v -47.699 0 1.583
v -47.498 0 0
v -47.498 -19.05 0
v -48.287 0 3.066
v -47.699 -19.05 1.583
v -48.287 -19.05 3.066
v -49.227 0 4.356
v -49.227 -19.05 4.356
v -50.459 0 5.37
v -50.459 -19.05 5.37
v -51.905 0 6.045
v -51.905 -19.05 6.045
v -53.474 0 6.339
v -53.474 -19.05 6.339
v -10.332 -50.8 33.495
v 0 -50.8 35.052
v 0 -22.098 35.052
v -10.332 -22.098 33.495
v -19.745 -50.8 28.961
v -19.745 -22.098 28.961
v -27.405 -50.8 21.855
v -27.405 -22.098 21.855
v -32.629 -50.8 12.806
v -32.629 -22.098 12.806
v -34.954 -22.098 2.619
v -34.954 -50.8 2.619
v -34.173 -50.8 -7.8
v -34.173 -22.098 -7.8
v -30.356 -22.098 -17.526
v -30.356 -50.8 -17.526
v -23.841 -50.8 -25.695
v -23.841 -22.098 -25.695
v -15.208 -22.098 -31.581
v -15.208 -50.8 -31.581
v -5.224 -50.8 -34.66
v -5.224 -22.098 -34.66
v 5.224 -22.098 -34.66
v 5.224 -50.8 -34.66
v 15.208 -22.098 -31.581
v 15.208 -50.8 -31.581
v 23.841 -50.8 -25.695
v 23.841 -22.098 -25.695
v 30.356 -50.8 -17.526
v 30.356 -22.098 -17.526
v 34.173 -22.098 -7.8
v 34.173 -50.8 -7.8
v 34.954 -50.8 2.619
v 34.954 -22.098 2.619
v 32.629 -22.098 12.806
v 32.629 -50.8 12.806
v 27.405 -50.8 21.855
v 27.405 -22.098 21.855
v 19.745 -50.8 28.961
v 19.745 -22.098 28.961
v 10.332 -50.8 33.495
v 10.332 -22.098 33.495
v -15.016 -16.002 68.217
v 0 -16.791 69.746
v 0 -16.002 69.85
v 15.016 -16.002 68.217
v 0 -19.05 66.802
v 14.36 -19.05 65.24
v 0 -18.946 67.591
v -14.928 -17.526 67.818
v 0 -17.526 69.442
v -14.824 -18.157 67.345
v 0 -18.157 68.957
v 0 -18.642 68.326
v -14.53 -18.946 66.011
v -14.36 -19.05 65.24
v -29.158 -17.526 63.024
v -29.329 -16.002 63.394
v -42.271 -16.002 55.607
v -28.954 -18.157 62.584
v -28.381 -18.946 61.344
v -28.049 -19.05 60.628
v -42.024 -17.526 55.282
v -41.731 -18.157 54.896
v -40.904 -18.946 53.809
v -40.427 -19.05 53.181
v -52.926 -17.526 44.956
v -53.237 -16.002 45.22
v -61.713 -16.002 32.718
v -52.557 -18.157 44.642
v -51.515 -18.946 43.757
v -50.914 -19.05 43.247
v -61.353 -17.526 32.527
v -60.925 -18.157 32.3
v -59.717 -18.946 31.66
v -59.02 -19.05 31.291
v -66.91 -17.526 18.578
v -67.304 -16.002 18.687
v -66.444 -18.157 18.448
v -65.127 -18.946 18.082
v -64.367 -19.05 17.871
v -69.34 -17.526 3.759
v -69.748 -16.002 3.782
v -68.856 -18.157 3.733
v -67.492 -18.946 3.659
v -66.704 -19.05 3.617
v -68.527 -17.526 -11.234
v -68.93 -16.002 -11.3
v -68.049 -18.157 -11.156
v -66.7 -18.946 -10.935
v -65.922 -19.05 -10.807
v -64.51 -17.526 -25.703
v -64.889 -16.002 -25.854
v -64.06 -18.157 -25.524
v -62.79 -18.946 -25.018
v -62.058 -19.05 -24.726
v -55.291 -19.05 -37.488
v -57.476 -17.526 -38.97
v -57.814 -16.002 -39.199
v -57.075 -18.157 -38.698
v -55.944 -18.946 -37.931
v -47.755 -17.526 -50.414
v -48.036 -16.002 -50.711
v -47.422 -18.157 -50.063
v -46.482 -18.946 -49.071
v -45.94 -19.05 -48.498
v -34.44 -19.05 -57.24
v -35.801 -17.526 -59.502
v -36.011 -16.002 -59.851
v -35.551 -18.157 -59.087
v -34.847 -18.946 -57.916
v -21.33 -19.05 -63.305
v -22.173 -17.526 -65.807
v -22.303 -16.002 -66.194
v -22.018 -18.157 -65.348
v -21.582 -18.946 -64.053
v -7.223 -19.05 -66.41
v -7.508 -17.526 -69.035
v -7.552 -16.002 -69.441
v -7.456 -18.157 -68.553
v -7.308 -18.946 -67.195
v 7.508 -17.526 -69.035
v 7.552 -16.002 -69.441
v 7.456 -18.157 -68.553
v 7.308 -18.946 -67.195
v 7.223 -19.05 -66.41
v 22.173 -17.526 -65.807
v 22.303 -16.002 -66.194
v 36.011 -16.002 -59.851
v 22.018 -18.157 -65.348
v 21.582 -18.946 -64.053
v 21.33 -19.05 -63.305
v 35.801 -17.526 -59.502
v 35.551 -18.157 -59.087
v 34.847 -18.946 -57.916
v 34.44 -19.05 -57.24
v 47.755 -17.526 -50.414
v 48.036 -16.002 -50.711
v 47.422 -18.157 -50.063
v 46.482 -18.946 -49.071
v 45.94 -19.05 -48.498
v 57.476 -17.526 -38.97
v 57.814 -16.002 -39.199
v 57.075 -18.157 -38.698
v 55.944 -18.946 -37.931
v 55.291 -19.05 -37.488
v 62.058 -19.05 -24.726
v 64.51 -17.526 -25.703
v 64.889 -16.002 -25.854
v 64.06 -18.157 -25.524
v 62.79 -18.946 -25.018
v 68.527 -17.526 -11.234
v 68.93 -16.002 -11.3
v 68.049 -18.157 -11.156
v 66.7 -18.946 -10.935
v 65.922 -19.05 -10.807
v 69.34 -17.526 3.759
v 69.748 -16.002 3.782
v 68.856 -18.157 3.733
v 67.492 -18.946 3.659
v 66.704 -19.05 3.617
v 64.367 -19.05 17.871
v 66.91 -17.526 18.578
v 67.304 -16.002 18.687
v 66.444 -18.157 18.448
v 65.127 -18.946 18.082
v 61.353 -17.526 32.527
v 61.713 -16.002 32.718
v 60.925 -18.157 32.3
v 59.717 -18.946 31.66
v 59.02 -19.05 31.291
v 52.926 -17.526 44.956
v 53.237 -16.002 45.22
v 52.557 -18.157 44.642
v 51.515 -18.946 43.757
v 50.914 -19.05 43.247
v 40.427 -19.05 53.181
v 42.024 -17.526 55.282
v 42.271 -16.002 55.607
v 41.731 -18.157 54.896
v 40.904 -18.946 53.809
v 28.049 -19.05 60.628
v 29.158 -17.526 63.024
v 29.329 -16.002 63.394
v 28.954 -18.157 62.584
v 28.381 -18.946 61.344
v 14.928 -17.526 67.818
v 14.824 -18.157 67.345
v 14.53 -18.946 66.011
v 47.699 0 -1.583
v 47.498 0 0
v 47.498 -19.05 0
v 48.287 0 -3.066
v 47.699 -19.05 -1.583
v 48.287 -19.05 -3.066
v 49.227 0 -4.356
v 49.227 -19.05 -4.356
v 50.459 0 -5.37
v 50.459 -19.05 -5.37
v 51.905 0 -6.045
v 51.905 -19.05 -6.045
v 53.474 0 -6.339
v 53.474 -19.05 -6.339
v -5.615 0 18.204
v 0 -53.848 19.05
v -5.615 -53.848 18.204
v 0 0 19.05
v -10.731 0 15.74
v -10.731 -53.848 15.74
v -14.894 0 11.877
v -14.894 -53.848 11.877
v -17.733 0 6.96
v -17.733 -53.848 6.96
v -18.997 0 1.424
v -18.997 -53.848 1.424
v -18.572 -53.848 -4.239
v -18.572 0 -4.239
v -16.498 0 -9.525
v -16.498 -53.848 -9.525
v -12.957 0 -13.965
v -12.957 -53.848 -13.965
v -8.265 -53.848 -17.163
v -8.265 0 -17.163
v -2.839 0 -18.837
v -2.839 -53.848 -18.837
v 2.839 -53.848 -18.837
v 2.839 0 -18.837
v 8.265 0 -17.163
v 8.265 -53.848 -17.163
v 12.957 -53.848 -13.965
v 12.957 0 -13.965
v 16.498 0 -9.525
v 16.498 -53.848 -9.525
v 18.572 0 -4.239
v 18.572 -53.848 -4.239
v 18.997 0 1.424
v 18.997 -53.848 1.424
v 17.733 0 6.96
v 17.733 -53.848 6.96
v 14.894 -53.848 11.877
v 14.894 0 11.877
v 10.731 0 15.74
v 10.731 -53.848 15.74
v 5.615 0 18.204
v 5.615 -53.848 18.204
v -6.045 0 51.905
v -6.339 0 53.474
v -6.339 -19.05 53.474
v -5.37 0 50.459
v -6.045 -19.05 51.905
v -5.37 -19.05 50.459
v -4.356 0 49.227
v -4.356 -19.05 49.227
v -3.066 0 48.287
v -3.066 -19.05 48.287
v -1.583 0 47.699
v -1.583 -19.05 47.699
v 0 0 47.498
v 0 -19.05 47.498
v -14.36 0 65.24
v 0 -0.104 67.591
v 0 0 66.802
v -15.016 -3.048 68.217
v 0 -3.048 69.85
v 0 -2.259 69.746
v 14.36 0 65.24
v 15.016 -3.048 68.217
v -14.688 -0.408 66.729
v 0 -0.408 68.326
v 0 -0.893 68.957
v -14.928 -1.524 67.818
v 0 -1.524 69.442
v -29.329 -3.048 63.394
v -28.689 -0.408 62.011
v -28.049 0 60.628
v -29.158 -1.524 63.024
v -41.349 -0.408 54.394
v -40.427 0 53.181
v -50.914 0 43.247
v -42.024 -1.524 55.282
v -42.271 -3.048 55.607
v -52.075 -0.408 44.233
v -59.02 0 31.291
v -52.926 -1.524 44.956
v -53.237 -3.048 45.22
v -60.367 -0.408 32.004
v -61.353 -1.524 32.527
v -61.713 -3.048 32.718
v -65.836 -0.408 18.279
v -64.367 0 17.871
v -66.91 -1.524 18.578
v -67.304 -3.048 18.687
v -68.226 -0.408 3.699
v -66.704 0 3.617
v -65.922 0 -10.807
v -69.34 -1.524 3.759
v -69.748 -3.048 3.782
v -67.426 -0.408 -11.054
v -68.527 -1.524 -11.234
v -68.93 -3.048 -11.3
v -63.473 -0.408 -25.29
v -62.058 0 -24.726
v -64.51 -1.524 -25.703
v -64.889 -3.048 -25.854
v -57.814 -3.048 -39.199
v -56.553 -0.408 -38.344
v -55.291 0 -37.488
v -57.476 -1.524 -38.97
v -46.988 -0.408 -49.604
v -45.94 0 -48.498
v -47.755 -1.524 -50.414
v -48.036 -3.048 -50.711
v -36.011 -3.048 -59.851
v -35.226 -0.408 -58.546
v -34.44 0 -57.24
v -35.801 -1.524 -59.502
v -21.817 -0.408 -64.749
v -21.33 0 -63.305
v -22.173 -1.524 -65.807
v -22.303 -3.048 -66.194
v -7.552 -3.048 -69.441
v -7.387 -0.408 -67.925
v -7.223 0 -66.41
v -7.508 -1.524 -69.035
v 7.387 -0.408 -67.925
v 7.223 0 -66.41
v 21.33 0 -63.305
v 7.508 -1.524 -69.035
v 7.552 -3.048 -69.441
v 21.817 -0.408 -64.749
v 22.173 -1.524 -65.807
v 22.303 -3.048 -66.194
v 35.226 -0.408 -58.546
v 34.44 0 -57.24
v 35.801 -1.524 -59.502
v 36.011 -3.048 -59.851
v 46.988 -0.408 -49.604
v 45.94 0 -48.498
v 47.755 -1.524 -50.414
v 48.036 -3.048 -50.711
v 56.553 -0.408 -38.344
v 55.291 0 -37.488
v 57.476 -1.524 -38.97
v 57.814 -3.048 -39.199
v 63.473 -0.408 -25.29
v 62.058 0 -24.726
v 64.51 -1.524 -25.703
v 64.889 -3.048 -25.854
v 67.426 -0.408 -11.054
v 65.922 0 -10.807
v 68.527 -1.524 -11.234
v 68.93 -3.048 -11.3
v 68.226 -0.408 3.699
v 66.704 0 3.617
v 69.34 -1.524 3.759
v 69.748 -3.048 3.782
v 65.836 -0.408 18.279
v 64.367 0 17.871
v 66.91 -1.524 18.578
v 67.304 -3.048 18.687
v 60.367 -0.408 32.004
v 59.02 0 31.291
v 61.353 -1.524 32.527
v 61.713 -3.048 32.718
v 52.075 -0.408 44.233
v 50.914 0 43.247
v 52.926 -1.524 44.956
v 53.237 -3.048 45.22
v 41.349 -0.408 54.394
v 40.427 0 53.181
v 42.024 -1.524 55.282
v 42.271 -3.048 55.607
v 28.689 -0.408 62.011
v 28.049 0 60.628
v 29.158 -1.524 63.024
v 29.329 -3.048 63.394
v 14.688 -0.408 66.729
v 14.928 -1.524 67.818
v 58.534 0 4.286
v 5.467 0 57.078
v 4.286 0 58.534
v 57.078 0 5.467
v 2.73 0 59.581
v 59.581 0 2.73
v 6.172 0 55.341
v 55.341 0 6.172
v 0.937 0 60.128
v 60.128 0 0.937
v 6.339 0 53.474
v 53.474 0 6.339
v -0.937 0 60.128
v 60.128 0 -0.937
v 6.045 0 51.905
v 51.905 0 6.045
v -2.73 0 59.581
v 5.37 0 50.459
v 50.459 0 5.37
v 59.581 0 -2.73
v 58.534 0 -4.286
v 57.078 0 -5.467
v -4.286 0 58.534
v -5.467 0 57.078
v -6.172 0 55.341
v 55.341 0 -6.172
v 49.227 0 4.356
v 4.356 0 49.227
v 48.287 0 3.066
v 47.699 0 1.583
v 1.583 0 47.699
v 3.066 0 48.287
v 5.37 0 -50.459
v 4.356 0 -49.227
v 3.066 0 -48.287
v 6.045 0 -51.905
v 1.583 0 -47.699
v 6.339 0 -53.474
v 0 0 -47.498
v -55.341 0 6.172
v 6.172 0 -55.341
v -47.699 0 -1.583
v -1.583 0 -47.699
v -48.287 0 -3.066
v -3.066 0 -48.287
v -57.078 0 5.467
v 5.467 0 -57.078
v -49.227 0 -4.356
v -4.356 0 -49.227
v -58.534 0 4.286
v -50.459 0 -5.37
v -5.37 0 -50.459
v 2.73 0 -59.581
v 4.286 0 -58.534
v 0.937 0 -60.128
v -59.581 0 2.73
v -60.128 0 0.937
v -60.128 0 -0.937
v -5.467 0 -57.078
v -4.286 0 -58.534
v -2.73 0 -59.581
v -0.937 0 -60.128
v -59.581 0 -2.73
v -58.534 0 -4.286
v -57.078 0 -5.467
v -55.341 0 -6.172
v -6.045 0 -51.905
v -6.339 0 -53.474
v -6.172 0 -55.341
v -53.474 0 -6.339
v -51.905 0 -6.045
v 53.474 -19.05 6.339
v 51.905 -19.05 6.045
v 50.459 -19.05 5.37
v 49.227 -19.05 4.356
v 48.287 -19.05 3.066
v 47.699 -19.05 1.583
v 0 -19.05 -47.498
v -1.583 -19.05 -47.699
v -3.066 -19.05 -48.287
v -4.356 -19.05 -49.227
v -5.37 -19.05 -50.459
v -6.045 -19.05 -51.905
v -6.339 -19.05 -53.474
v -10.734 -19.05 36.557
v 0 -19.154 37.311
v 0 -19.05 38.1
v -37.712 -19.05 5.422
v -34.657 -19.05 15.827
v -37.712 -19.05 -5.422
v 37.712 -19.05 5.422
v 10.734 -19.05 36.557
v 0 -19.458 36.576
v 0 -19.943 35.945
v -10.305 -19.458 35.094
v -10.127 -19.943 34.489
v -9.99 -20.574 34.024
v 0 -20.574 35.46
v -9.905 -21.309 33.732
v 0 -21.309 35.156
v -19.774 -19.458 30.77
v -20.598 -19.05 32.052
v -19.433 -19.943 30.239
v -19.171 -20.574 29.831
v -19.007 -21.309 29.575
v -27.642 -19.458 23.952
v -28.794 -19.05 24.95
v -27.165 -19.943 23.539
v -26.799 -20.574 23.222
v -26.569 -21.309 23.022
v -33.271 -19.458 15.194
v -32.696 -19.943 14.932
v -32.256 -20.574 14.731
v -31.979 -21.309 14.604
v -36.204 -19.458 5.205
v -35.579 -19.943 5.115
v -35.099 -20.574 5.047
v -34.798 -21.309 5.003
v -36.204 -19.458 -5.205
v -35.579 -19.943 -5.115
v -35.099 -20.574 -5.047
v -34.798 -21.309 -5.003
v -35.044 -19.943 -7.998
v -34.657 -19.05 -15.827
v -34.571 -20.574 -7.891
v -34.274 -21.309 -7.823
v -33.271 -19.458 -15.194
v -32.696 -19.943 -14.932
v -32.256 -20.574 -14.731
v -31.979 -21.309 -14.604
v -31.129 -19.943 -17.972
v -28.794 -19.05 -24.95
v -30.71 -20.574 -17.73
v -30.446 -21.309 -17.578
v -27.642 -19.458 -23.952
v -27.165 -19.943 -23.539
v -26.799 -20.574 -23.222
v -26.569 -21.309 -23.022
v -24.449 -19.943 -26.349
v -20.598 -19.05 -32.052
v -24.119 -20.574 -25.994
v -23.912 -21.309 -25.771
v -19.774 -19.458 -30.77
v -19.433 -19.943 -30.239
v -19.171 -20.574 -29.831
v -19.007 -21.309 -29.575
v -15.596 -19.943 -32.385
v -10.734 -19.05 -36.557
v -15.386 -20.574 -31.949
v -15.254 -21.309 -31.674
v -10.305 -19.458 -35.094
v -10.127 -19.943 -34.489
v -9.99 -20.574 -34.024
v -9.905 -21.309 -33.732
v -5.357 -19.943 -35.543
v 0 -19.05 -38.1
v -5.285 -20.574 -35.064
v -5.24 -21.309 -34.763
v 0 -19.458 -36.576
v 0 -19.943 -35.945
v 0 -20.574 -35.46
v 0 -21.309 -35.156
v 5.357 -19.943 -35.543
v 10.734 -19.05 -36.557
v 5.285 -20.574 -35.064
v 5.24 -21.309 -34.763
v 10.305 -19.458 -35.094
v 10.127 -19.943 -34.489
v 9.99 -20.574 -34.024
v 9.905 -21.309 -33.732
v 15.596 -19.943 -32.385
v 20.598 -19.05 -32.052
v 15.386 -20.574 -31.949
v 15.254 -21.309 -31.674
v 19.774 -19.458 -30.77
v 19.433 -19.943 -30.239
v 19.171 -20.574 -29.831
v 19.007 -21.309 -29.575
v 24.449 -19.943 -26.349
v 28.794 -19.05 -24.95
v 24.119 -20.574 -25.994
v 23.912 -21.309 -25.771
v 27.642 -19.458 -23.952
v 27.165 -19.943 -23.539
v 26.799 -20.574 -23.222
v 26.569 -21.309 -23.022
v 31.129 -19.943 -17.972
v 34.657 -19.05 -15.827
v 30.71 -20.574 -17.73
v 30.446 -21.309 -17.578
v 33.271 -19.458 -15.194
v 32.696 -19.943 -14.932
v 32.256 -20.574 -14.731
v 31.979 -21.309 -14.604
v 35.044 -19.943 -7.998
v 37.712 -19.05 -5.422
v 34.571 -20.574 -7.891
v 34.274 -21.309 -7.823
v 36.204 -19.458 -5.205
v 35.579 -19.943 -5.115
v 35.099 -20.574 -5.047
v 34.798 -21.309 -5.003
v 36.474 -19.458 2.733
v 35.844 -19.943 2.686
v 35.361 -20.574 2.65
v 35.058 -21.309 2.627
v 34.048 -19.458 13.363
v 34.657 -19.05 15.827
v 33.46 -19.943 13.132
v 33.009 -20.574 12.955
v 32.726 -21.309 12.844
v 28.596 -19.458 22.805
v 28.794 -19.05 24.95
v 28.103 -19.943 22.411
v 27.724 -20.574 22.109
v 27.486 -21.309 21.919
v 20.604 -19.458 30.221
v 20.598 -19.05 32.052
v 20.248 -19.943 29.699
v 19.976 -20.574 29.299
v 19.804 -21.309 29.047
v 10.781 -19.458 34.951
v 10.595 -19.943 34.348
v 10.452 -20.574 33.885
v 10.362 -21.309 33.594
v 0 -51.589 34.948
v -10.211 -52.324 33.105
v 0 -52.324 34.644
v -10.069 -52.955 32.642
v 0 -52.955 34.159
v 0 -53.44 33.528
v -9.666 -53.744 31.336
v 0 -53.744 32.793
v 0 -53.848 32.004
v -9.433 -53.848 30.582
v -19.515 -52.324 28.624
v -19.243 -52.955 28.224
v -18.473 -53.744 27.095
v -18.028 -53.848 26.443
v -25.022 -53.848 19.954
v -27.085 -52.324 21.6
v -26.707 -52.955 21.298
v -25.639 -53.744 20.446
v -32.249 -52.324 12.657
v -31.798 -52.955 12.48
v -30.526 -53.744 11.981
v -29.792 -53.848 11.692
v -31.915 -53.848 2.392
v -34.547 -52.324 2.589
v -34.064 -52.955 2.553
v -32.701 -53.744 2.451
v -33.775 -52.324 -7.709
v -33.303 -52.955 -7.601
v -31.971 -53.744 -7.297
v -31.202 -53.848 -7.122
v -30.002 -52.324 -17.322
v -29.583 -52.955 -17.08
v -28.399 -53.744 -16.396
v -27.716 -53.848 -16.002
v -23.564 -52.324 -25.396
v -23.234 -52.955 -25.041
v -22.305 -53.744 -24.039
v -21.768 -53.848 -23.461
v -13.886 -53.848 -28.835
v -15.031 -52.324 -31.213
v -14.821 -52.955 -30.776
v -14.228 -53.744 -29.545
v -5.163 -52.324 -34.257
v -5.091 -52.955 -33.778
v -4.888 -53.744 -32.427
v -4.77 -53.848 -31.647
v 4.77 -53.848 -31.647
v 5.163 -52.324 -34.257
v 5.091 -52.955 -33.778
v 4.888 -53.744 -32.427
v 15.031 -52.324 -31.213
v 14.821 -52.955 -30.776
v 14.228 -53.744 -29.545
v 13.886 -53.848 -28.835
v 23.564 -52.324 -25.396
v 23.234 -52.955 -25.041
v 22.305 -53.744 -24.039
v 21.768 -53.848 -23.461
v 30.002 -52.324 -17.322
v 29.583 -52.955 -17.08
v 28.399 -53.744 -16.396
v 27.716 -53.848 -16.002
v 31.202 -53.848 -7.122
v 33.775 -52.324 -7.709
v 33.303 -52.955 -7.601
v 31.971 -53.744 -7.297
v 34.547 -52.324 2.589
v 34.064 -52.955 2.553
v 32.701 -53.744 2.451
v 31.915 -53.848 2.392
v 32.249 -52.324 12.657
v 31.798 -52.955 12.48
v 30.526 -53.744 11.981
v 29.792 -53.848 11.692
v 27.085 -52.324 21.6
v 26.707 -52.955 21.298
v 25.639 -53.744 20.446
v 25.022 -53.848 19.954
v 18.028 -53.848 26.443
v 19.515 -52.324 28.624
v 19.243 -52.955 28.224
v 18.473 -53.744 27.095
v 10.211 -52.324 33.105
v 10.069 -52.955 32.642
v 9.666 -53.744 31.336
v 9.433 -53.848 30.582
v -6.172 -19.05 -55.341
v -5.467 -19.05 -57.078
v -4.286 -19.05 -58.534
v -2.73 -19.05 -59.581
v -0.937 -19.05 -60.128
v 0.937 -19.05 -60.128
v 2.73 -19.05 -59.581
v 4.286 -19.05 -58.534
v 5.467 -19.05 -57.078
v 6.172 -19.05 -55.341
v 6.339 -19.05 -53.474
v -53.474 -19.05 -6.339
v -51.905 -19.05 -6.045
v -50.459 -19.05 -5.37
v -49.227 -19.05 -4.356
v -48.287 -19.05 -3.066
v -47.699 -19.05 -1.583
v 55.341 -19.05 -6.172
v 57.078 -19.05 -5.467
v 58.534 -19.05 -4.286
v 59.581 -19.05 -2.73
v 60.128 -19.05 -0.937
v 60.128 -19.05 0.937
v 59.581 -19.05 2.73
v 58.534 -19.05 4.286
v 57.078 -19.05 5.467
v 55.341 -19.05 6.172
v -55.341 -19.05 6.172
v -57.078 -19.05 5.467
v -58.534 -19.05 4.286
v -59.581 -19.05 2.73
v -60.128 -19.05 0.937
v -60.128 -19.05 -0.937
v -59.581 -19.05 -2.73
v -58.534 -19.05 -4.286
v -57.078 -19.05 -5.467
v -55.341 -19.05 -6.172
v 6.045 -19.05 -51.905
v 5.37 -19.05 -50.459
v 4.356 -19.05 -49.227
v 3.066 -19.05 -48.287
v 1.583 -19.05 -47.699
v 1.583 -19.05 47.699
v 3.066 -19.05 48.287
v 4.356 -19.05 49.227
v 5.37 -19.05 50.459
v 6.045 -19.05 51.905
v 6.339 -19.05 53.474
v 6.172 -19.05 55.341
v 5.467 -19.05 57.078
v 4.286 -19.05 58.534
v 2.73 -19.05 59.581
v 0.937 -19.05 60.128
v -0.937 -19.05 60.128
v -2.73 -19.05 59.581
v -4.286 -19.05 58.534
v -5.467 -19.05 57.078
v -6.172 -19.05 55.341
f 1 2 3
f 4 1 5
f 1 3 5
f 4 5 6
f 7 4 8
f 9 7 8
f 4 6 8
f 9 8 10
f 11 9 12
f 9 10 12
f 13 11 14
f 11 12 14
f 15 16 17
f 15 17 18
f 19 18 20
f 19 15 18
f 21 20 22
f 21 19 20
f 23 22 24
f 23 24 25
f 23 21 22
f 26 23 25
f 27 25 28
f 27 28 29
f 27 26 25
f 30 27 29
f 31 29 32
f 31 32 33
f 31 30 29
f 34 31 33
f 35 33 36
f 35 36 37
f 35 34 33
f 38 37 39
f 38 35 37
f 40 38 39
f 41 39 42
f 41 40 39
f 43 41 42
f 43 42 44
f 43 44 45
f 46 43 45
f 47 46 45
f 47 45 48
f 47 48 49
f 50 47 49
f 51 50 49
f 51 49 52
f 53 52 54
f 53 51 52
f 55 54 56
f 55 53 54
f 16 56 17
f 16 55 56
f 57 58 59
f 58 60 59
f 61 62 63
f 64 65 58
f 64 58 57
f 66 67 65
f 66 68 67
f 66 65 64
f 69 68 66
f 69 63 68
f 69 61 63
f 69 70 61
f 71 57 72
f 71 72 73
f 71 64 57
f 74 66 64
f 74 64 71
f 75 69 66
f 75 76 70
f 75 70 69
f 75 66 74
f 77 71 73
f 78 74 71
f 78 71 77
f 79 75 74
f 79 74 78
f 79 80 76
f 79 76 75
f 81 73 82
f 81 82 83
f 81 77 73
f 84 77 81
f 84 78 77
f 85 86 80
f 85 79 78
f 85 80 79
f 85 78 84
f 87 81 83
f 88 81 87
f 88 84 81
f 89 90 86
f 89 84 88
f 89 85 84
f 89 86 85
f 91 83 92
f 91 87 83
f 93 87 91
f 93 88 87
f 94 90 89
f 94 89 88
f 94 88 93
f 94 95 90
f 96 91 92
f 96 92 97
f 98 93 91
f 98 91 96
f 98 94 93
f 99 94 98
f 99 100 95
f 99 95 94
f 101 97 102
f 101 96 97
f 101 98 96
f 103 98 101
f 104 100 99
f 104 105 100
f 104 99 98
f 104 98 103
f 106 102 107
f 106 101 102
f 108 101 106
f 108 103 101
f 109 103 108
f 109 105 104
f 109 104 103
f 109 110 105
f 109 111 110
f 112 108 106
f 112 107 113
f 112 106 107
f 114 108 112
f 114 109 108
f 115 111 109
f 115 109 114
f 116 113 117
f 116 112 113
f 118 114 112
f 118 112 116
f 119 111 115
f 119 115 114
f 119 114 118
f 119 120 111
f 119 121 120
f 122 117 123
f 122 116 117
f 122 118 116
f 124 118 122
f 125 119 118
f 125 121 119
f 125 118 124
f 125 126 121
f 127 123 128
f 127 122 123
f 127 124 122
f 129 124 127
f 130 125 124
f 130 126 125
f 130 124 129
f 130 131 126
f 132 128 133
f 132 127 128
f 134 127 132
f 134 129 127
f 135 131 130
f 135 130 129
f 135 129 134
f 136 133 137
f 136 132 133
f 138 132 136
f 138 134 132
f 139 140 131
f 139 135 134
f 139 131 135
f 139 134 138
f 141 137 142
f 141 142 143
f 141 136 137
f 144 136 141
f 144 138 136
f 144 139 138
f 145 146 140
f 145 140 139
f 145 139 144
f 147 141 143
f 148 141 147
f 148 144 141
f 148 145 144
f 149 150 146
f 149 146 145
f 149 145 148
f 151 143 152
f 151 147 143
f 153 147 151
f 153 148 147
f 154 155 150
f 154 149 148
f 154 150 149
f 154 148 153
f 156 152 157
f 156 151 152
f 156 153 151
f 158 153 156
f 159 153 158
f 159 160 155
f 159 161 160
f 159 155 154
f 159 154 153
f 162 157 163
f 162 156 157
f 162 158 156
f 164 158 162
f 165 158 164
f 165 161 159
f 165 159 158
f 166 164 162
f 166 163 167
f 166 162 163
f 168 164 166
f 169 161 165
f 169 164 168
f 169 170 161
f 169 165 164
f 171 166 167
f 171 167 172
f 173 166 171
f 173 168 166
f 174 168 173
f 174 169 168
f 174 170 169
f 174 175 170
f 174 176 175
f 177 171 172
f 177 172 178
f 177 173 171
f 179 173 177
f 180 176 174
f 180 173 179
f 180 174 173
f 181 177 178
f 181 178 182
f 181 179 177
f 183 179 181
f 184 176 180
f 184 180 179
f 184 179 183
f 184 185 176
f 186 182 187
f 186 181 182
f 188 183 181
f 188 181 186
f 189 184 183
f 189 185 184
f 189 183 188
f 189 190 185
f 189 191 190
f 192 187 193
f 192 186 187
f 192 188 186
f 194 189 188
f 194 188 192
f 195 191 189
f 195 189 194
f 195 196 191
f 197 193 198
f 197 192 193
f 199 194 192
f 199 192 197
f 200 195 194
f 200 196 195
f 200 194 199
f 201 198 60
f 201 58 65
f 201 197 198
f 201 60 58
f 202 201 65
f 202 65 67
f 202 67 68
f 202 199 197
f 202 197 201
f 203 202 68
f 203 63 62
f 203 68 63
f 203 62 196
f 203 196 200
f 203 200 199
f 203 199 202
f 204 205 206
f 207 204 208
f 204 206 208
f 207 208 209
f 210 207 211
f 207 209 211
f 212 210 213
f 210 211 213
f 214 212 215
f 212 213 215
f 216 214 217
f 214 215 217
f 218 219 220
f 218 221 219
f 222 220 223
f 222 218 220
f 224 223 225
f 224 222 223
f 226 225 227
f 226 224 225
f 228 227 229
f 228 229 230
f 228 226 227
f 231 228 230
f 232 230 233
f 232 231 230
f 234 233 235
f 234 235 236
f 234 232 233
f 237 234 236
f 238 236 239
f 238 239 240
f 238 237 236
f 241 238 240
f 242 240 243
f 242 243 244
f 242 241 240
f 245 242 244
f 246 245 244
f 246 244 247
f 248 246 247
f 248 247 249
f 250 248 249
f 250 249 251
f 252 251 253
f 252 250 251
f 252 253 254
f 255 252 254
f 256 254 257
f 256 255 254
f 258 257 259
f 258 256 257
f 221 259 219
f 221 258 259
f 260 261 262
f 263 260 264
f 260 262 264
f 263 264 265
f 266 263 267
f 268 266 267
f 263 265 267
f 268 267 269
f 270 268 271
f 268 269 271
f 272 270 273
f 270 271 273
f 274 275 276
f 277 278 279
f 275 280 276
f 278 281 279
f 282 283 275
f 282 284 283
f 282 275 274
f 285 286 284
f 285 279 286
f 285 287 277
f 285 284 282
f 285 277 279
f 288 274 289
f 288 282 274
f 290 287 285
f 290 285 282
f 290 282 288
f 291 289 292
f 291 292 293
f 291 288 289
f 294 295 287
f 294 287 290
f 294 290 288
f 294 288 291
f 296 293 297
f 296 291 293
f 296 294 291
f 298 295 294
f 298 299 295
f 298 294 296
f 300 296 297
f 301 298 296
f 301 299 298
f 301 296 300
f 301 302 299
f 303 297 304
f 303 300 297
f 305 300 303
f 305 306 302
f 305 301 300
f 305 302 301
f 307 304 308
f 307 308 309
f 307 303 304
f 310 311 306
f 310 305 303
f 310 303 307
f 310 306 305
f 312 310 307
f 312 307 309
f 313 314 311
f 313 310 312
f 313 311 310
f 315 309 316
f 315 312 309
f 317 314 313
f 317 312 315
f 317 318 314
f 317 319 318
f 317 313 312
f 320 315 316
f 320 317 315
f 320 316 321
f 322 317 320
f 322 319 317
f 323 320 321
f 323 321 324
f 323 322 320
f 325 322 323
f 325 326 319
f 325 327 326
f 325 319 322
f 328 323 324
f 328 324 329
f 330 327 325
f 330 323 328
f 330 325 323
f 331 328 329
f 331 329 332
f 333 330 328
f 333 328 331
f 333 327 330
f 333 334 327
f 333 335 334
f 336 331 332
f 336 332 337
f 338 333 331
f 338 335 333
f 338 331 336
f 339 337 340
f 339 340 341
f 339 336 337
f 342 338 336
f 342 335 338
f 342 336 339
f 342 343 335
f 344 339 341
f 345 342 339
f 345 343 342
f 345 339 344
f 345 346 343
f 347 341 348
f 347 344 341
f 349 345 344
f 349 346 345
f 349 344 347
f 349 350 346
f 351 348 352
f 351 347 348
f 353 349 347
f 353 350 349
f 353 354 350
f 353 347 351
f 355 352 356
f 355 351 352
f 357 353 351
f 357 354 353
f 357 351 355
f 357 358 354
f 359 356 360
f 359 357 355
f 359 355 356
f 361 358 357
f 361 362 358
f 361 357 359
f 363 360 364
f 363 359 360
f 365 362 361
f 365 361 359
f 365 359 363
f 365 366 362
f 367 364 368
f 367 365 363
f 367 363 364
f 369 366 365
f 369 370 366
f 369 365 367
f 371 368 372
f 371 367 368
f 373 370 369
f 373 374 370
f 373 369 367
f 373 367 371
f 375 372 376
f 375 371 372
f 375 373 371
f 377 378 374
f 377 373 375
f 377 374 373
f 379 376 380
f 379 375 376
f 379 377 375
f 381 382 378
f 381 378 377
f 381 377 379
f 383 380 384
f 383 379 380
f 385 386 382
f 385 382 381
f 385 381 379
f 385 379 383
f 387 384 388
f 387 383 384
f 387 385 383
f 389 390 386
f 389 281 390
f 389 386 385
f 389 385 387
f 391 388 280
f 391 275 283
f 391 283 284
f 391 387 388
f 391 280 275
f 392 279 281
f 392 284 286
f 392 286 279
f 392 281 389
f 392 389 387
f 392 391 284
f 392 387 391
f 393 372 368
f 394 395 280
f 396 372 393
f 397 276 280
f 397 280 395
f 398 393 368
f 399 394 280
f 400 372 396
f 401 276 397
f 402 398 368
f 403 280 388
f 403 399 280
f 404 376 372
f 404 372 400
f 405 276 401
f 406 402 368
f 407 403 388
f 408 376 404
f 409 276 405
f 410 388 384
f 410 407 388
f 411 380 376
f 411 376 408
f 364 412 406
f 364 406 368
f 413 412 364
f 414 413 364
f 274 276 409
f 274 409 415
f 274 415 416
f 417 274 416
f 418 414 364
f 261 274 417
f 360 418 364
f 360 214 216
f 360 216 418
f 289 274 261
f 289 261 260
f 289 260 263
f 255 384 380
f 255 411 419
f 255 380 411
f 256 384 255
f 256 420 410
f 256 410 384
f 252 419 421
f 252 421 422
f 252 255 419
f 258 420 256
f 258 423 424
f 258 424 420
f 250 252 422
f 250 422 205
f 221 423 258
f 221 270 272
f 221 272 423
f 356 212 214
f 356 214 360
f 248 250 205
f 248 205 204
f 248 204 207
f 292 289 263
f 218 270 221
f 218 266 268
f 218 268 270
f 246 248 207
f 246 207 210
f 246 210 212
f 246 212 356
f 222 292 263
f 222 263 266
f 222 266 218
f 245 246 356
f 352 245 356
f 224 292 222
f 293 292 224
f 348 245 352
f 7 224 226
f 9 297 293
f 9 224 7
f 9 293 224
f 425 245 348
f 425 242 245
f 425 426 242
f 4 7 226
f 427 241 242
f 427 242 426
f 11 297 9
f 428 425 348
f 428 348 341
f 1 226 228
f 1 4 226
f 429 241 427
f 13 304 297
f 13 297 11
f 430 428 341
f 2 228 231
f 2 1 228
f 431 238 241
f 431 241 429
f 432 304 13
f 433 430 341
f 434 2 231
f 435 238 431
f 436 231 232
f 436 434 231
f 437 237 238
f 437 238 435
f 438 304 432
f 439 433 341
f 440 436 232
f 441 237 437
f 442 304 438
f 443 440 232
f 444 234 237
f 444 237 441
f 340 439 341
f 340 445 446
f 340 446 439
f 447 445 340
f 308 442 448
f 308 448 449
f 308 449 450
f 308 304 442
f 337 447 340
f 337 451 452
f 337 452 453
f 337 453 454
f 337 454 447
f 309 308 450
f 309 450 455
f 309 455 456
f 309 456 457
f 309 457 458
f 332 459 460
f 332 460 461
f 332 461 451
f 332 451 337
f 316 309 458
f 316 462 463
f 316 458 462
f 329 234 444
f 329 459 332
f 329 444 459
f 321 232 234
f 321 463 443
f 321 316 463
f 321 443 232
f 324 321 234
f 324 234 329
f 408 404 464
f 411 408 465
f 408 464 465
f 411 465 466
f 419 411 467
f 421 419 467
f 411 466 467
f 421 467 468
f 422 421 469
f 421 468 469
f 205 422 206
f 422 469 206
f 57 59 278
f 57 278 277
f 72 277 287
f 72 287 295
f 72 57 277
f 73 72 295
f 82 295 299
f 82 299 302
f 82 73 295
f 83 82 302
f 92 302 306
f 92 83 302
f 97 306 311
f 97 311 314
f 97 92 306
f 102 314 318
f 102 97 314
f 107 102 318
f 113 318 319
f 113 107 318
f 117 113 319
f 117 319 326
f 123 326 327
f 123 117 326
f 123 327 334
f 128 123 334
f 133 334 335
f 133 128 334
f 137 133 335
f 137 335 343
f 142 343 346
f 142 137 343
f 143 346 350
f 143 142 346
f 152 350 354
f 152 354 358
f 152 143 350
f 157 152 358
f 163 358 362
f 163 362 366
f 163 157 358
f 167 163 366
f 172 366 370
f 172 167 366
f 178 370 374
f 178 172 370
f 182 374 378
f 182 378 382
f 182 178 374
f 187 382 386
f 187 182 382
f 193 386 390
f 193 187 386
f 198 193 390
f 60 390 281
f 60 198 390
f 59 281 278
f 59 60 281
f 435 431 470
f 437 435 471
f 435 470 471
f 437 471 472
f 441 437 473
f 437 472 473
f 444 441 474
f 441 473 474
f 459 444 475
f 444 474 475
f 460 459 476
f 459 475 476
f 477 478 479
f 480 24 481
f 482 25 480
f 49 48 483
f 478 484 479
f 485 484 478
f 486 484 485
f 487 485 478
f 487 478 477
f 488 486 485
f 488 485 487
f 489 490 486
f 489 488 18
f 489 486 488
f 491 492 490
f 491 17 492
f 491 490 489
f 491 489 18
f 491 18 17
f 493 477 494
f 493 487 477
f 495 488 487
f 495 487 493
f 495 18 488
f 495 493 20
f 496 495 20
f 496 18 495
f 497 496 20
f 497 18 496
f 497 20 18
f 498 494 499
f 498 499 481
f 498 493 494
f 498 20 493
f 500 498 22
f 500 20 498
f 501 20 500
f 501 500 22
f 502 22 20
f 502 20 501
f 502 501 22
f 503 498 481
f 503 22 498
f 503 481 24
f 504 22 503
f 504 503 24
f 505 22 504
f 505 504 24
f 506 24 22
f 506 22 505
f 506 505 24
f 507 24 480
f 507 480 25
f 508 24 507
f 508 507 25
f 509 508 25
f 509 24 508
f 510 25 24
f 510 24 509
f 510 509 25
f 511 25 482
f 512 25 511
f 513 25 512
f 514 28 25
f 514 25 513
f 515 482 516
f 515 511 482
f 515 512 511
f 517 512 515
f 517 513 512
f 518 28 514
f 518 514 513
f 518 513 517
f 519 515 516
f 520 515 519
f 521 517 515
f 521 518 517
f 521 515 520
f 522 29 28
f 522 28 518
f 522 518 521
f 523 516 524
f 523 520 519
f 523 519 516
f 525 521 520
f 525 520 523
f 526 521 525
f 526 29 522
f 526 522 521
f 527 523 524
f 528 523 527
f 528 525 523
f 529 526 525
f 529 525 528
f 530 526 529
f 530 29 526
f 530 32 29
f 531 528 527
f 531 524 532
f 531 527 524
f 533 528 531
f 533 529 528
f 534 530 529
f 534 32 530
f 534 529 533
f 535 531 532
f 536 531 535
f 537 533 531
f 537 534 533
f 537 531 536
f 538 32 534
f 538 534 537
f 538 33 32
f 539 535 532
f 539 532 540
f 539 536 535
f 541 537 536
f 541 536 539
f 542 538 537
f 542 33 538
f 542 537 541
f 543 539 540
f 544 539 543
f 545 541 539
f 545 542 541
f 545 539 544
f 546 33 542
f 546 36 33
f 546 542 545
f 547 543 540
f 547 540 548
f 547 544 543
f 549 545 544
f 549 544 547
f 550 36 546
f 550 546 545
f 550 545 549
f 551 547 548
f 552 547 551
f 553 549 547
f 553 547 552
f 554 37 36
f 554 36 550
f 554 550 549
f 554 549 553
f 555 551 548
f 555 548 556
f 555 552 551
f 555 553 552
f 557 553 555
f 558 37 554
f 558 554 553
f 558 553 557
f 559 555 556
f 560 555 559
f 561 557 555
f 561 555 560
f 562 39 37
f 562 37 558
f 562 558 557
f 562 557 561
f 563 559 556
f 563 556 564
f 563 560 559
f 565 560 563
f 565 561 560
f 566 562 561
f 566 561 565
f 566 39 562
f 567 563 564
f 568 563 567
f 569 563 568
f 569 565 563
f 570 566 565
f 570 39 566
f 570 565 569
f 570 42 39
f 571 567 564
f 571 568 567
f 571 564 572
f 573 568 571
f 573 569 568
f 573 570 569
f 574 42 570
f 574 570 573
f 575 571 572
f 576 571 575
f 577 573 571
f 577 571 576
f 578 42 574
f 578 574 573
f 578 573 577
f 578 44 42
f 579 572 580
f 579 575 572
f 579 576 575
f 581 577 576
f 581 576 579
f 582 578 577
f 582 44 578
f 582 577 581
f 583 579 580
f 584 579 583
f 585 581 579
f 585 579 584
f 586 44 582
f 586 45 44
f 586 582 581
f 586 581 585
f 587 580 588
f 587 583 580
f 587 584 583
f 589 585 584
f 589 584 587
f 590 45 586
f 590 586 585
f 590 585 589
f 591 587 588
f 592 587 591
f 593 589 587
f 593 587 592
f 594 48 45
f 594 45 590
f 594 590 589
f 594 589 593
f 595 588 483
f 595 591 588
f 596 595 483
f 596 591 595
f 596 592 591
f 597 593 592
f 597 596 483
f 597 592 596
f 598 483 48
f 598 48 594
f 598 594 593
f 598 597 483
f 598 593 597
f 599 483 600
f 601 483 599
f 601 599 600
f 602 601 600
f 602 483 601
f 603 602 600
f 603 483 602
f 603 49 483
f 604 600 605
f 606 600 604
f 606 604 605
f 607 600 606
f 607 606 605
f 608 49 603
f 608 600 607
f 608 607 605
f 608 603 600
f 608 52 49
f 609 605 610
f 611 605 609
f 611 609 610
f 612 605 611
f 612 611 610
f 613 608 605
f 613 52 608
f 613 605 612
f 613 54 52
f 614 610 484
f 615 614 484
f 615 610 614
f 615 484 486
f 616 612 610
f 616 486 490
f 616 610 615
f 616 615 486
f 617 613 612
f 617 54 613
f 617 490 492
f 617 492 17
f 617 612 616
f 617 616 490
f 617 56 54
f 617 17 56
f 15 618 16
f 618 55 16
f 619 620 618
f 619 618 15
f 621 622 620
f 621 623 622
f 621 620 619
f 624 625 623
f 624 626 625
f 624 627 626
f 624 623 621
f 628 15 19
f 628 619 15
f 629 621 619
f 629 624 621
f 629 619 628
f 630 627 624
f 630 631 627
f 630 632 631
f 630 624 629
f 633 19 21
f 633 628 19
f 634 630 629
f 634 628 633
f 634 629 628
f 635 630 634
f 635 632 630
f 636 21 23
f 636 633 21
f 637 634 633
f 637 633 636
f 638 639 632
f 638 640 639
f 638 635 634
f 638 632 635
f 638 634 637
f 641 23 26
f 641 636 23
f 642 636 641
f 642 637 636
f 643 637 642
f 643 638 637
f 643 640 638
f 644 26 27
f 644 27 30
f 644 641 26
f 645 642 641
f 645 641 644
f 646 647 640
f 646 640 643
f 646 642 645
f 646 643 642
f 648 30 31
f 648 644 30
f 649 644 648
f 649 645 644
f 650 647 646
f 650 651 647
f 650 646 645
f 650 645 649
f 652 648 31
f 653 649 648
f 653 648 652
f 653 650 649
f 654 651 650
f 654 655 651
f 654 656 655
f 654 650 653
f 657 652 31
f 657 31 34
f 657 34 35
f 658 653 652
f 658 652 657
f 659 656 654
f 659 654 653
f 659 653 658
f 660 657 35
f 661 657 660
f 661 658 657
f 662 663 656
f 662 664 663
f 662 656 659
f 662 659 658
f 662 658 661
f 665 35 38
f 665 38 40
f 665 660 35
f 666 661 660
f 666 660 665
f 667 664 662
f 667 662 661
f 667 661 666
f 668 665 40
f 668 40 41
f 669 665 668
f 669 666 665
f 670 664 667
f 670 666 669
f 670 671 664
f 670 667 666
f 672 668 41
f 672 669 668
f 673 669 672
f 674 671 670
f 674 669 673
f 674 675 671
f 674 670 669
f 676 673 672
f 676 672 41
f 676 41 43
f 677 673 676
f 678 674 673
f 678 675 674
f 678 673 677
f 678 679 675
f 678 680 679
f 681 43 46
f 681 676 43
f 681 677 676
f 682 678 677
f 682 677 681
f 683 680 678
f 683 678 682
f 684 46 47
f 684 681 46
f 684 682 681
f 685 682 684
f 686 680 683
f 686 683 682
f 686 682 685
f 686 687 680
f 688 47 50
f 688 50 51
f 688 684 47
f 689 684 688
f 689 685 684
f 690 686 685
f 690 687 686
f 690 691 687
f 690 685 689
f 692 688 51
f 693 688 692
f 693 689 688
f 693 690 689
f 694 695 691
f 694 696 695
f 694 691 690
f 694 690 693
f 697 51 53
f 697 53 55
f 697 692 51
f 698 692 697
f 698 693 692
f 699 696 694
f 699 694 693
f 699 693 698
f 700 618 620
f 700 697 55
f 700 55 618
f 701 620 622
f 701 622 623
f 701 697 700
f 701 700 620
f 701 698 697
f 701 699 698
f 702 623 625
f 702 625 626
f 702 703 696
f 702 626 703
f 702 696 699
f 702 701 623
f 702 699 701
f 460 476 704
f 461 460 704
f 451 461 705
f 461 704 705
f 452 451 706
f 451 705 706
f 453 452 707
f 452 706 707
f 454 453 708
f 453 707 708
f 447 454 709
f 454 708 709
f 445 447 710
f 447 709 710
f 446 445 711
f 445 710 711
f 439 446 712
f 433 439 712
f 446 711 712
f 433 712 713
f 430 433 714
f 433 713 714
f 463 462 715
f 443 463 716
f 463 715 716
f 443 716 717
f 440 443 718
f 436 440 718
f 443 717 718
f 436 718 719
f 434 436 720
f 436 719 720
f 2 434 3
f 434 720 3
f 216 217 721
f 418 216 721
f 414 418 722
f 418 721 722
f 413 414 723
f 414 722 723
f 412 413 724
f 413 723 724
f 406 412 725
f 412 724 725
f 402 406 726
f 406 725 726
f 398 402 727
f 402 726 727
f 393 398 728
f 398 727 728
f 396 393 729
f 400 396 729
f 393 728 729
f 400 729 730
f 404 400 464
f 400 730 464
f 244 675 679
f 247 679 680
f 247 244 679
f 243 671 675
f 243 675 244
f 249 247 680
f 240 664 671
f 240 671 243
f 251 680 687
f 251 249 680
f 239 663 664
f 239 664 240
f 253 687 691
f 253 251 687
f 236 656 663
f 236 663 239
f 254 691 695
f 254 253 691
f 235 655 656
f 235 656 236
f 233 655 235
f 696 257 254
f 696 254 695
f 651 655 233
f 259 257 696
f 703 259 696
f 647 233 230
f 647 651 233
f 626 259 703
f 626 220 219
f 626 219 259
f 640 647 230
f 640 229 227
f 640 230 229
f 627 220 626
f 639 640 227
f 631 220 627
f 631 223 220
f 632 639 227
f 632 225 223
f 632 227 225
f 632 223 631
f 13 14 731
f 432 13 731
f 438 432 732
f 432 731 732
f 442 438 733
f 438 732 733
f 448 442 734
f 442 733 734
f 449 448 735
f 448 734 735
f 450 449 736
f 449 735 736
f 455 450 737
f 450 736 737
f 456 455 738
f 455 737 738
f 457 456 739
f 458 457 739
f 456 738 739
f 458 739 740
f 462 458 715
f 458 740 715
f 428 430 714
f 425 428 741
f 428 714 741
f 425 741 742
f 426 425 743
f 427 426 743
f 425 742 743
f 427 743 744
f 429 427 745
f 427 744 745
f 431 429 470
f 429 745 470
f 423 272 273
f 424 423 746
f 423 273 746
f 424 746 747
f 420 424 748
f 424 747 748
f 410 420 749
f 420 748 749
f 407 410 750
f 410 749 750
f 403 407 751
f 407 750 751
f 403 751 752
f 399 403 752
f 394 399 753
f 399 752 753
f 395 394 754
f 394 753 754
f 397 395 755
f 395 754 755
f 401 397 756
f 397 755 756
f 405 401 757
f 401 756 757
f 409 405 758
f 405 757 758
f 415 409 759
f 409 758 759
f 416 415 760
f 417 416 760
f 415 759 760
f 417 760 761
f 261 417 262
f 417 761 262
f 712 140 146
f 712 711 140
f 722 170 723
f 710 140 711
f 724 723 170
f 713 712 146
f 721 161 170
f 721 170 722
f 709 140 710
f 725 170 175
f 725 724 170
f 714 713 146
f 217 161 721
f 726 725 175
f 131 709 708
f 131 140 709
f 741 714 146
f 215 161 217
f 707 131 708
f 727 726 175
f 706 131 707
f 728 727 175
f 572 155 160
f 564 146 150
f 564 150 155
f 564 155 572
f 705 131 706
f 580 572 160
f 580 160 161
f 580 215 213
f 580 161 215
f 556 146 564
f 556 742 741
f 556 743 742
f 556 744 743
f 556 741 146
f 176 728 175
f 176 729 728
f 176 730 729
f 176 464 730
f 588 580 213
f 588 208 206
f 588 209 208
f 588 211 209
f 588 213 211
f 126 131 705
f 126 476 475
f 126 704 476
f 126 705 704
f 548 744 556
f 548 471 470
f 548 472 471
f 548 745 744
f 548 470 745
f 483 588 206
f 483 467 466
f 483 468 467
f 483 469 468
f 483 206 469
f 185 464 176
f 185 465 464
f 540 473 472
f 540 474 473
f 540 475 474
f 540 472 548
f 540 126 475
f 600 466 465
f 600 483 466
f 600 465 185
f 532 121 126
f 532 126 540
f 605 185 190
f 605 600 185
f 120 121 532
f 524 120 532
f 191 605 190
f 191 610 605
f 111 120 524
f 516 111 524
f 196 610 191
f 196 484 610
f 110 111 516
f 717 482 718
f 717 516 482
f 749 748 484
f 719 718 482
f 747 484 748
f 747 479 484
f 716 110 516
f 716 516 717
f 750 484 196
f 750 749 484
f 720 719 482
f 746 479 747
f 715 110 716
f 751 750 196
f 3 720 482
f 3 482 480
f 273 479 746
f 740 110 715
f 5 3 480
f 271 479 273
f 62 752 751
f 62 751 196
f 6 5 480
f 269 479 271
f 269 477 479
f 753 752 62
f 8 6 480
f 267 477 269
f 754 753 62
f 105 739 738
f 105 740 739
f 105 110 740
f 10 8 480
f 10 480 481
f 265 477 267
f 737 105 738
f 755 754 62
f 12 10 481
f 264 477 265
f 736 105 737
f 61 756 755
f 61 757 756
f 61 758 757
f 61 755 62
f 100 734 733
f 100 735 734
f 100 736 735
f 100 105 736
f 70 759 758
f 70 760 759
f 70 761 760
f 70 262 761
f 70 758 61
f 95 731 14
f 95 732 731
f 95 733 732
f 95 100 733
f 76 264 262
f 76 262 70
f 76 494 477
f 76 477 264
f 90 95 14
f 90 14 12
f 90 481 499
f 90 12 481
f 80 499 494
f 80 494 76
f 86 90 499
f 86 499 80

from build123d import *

# Parameters (mm, degrees)
F3_R            = 3.048
F4_DEPTH        = 19.051
F4_COPIES_COUNT = 4


# Not quite as in the source:
# - a pattern or mirror of a feature is missing from the dataset's text; its kind, count and spacing are read off the source's solid


with BuildPart() as f1:
    # F0 (on Right) → F1 (revolve)
    with BuildSketch(Plane.YZ):
        Polygon((-53.848, 19.05), (0, 19.05), (0, 69.85), (-19.05, 69.85), (-19.05, 35.052), (-53.848, 35.052), align=None)
    revolve(axis=Axis((0, -26.924, 0), (0, -1, 0)))

    # F3
    f3_edges = [f1.edges().sort_by_distance(p)[0] for p in [
        (0, -19.05, -69.85),
        (0, 0, -69.85),
        (0, -19.05, -35.052),
        (0, -53.848, -35.052),
    ]]
    fillet(f3_edges, radius=F3_R)

    # F2 (on face) → F4 (cut, through all)
    with BuildSketch(Plane.XZ.offset(19.05)):
        with BuildLine():
            ThreePointArc((-47.498, 0), (-49.2273936601, 4.3557429965), (-53.4735896226, 6.3389523479))
            ThreePointArc((-53.4735896226, 6.3389523479), (-53.848, 0), (-53.4735896226, -6.3389523479))
            ThreePointArc((-53.4735896226, -6.3389523479), (-49.2273936601, -4.3557429965), (-47.498, 0))
        make_face()
        with BuildLine():
            ThreePointArc((-53.4735896226, -6.3389523479), (-53.848, 0), (-53.4735896226, 6.3389523479))
            ThreePointArc((-53.4735896226, 6.3389523479), (-60.198, 0), (-53.4735896226, -6.3389523479))
        make_face()
    f4 = extrude(amount=-F4_DEPTH, mode=Mode.SUBTRACT)

    # F4_copies: F4 ×4 about axis
    f4_copies_axis = Axis((0, 0, 0), (0, 1, 0))
    for i in range(1, F4_COPIES_COUNT):
        add(f4.rotate(f4_copies_axis, i * 360 / F4_COPIES_COUNT), mode=Mode.SUBTRACT)


solid = f1.part
